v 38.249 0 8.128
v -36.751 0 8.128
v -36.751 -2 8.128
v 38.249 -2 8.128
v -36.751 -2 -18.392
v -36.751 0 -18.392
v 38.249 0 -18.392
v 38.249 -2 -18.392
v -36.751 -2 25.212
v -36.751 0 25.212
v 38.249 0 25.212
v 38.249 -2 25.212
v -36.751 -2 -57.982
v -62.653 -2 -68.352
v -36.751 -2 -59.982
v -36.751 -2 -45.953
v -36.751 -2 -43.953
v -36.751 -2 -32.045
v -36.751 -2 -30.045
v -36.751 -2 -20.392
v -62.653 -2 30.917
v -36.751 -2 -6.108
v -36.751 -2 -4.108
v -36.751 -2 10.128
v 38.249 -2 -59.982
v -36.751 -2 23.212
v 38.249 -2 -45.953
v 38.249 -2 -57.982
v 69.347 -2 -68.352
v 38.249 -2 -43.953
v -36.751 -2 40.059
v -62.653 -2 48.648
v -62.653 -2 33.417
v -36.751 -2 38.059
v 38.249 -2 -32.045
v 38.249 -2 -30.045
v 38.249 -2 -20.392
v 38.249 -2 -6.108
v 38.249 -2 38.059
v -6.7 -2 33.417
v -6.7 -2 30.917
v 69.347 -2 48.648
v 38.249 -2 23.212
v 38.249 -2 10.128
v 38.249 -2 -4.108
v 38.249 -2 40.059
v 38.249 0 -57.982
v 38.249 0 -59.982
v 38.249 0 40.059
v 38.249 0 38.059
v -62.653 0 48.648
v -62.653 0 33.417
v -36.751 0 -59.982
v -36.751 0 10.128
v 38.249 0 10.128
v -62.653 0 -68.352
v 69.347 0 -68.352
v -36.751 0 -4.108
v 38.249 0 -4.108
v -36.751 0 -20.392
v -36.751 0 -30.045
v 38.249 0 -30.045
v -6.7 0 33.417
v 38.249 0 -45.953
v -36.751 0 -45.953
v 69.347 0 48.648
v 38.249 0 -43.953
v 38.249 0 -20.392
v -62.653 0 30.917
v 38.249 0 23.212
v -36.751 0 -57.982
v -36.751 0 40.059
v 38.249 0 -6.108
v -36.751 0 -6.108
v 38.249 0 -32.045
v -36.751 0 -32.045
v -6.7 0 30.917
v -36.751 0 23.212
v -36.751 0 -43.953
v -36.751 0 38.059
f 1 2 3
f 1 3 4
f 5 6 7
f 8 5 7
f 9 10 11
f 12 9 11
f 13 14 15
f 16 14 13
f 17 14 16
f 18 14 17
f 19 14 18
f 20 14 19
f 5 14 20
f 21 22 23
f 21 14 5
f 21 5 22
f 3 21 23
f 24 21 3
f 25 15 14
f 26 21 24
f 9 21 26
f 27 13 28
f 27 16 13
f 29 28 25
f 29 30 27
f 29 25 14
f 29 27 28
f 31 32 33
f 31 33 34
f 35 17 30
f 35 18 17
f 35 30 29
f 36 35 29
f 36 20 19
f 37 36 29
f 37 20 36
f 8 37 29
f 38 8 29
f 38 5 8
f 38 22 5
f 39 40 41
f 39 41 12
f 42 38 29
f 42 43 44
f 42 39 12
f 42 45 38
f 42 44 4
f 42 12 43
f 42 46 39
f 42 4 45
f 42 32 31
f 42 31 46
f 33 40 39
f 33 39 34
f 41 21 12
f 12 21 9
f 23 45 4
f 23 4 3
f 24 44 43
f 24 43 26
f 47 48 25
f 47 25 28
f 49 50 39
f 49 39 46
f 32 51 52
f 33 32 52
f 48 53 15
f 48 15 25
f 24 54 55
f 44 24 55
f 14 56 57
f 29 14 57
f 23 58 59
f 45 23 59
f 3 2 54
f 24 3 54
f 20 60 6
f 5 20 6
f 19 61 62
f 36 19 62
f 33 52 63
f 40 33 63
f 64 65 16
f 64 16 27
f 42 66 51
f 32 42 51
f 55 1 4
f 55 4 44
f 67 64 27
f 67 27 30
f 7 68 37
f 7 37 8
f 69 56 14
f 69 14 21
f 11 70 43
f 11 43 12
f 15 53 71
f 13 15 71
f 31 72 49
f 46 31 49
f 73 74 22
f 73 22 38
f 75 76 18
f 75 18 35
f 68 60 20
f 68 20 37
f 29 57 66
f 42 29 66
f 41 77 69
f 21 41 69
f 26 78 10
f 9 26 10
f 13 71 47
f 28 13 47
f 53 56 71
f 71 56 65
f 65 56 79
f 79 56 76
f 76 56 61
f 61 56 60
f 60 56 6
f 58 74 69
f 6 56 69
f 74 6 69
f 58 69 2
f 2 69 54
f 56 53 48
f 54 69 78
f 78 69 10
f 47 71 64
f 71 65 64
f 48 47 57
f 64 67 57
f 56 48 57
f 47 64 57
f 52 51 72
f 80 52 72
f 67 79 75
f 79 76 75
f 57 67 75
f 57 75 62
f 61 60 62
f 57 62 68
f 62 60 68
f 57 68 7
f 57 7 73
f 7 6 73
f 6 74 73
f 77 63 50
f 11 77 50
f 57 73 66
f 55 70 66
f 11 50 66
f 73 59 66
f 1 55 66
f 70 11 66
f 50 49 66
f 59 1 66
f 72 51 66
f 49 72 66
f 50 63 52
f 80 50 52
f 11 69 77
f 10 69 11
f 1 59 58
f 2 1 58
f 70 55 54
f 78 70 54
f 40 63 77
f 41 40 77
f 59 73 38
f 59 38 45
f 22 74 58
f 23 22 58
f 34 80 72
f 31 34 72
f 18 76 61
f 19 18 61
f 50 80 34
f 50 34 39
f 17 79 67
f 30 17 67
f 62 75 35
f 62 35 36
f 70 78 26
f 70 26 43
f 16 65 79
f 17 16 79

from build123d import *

# Parameters (mm, degrees)
F0_W     = 75
F0_H     = 2
F0_W_2   = 8.9530238211
F0_H_2   = 10.3744039685
F0_H_3   = 13.0056687072
F0_H_4   = 12.9116945341
F1_DEPTH = 1
F2_DEPTH = 2


with BuildPart() as f1:
    # F0 (on Front) → F1 (new body)
    with BuildSketch(Plane.XZ):
        Polygon((-53.6999596655, 0), (-53.6999596655, -10.3744039685), (-6.6999596655, -10.3744039685), (-6.6999596655, -12.8744039685), (-53.6999596655, -12.8744039685), (-62.6529834867, -12.8744039685), (-62.6529834867, -68.3524683118), (69.3470165133, -68.3524683118), (69.3470165133, 48.6475316882), (-62.6529834867, 48.6475316882), (-62.6529834867, 33.4173632413), (-53.6999596655, 33.4173632413), (-6.6999596655, 33.4173632413), (-6.6999596655, 30.9173632413), (-53.6999596655, 30.9173632413), (-53.6999596655, 18.0056687072), (-6.6999596655, 18.0056687072), (-6.6999596655, 15.5056687072), (-53.6999596655, 15.5056687072), (-53.6999596655, 2.5), (-6.6999596655, 2.5), (-6.6999596655, 0), align=None)
        with Locations((0.7488928735, -58.9818040133)):
            Rectangle(F0_W, F0_H, mode=Mode.SUBTRACT)
        with Locations((0.7488928735, -44.9531620145)):
            Rectangle(F0_W, F0_H, mode=Mode.SUBTRACT)
        with Locations((0.7488928735, -31.0450477302)):
            Rectangle(F0_W, F0_H, mode=Mode.SUBTRACT)
        with Locations((0.7488928735, -19.3923042864)):
            Rectangle(F0_W, F0_H, mode=Mode.SUBTRACT)
        with Locations((0.7488928735, -5.1082937755)):
            Rectangle(F0_W, F0_H, mode=Mode.SUBTRACT)
        with Locations((0.7488928735, 9.1280854344)):
            Rectangle(F0_W, F0_H, mode=Mode.SUBTRACT)
        with Locations((0.7488928735, 24.2115164399)):
            Rectangle(F0_W, F0_H, mode=Mode.SUBTRACT)
        with Locations((0.7488928735, 39.0593687296)):
            Rectangle(F0_W, F0_H, mode=Mode.SUBTRACT)
        with Locations((-58.1764715761, -5.1872019842)):
            Rectangle(F0_W_2, F0_H_2)
        Polygon((-6.6999596655, -10.3744039685), (-53.6999596655, -10.3744039685), (-62.6529834867, -10.3744039685), (-62.6529834867, -12.8744039685), (-53.6999596655, -12.8744039685), (-6.6999596655, -12.8744039685), align=None)
        Polygon((-62.6529834867, 0), (-53.6999596655, 0), (-6.6999596655, 0), (-6.6999596655, 2.5), (-53.6999596655, 2.5), (-62.6529834867, 2.5), align=None)
        with Locations((-58.1764715761, 9.0028343536)):
            Rectangle(F0_W_2, F0_H_3)
        Polygon((-62.6529834867, 18.0056687072), (-62.6529834867, 15.5056687072), (-53.6999596655, 15.5056687072), (-6.6999596655, 15.5056687072), (-6.6999596655, 18.0056687072), (-53.6999596655, 18.0056687072), align=None)
        with Locations((-58.1764715761, 24.4615159743)):
            Rectangle(F0_W_2, F0_H_4)
    extrude(amount=F1_DEPTH)

    # F0 (on Front) → F2 (join)
    with BuildSketch(Plane.XZ):
        Polygon((-53.6999596655, 0), (-53.6999596655, -10.3744039685), (-6.6999596655, -10.3744039685), (-6.6999596655, -12.8744039685), (-53.6999596655, -12.8744039685), (-62.6529834867, -12.8744039685), (-62.6529834867, -68.3524683118), (69.3470165133, -68.3524683118), (69.3470165133, 48.6475316882), (-62.6529834867, 48.6475316882), (-62.6529834867, 33.4173632413), (-53.6999596655, 33.4173632413), (-6.6999596655, 33.4173632413), (-6.6999596655, 30.9173632413), (-53.6999596655, 30.9173632413), (-53.6999596655, 18.0056687072), (-6.6999596655, 18.0056687072), (-6.6999596655, 15.5056687072), (-53.6999596655, 15.5056687072), (-53.6999596655, 2.5), (-6.6999596655, 2.5), (-6.6999596655, 0), align=None)
        with Locations((0.7488928735, -58.9818040133)):
            Rectangle(F0_W, F0_H, mode=Mode.SUBTRACT)
        with Locations((0.7488928735, -44.9531620145)):
            Rectangle(F0_W, F0_H, mode=Mode.SUBTRACT)
        with Locations((0.7488928735, -31.0450477302)):
            Rectangle(F0_W, F0_H, mode=Mode.SUBTRACT)
        with Locations((0.7488928735, -19.3923042864)):
            Rectangle(F0_W, F0_H, mode=Mode.SUBTRACT)
        with Locations((0.7488928735, -5.1082937755)):
            Rectangle(F0_W, F0_H, mode=Mode.SUBTRACT)
        with Locations((0.7488928735, 9.1280854344)):
            Rectangle(F0_W, F0_H, mode=Mode.SUBTRACT)
        with Locations((0.7488928735, 24.2115164399)):
            Rectangle(F0_W, F0_H, mode=Mode.SUBTRACT)
        with Locations((0.7488928735, 39.0593687296)):
            Rectangle(F0_W, F0_H, mode=Mode.SUBTRACT)
        with Locations((-58.1764715761, -5.1872019842)):
            Rectangle(F0_W_2, F0_H_2)
        Polygon((-6.6999596655, -10.3744039685), (-53.6999596655, -10.3744039685), (-62.6529834867, -10.3744039685), (-62.6529834867, -12.8744039685), (-53.6999596655, -12.8744039685), (-6.6999596655, -12.8744039685), align=None)
        Polygon((-62.6529834867, 0), (-53.6999596655, 0), (-6.6999596655, 0), (-6.6999596655, 2.5), (-53.6999596655, 2.5), (-62.6529834867, 2.5), align=None)
        with Locations((-58.1764715761, 9.0028343536)):
            Rectangle(F0_W_2, F0_H_3)
        Polygon((-62.6529834867, 18.0056687072), (-62.6529834867, 15.5056687072), (-53.6999596655, 15.5056687072), (-6.6999596655, 15.5056687072), (-6.6999596655, 18.0056687072), (-53.6999596655, 18.0056687072), align=None)
        with Locations((-58.1764715761, 24.4615159743)):
            Rectangle(F0_W_2, F0_H_4)
    extrude(amount=F2_DEPTH)


solid = f1.part
